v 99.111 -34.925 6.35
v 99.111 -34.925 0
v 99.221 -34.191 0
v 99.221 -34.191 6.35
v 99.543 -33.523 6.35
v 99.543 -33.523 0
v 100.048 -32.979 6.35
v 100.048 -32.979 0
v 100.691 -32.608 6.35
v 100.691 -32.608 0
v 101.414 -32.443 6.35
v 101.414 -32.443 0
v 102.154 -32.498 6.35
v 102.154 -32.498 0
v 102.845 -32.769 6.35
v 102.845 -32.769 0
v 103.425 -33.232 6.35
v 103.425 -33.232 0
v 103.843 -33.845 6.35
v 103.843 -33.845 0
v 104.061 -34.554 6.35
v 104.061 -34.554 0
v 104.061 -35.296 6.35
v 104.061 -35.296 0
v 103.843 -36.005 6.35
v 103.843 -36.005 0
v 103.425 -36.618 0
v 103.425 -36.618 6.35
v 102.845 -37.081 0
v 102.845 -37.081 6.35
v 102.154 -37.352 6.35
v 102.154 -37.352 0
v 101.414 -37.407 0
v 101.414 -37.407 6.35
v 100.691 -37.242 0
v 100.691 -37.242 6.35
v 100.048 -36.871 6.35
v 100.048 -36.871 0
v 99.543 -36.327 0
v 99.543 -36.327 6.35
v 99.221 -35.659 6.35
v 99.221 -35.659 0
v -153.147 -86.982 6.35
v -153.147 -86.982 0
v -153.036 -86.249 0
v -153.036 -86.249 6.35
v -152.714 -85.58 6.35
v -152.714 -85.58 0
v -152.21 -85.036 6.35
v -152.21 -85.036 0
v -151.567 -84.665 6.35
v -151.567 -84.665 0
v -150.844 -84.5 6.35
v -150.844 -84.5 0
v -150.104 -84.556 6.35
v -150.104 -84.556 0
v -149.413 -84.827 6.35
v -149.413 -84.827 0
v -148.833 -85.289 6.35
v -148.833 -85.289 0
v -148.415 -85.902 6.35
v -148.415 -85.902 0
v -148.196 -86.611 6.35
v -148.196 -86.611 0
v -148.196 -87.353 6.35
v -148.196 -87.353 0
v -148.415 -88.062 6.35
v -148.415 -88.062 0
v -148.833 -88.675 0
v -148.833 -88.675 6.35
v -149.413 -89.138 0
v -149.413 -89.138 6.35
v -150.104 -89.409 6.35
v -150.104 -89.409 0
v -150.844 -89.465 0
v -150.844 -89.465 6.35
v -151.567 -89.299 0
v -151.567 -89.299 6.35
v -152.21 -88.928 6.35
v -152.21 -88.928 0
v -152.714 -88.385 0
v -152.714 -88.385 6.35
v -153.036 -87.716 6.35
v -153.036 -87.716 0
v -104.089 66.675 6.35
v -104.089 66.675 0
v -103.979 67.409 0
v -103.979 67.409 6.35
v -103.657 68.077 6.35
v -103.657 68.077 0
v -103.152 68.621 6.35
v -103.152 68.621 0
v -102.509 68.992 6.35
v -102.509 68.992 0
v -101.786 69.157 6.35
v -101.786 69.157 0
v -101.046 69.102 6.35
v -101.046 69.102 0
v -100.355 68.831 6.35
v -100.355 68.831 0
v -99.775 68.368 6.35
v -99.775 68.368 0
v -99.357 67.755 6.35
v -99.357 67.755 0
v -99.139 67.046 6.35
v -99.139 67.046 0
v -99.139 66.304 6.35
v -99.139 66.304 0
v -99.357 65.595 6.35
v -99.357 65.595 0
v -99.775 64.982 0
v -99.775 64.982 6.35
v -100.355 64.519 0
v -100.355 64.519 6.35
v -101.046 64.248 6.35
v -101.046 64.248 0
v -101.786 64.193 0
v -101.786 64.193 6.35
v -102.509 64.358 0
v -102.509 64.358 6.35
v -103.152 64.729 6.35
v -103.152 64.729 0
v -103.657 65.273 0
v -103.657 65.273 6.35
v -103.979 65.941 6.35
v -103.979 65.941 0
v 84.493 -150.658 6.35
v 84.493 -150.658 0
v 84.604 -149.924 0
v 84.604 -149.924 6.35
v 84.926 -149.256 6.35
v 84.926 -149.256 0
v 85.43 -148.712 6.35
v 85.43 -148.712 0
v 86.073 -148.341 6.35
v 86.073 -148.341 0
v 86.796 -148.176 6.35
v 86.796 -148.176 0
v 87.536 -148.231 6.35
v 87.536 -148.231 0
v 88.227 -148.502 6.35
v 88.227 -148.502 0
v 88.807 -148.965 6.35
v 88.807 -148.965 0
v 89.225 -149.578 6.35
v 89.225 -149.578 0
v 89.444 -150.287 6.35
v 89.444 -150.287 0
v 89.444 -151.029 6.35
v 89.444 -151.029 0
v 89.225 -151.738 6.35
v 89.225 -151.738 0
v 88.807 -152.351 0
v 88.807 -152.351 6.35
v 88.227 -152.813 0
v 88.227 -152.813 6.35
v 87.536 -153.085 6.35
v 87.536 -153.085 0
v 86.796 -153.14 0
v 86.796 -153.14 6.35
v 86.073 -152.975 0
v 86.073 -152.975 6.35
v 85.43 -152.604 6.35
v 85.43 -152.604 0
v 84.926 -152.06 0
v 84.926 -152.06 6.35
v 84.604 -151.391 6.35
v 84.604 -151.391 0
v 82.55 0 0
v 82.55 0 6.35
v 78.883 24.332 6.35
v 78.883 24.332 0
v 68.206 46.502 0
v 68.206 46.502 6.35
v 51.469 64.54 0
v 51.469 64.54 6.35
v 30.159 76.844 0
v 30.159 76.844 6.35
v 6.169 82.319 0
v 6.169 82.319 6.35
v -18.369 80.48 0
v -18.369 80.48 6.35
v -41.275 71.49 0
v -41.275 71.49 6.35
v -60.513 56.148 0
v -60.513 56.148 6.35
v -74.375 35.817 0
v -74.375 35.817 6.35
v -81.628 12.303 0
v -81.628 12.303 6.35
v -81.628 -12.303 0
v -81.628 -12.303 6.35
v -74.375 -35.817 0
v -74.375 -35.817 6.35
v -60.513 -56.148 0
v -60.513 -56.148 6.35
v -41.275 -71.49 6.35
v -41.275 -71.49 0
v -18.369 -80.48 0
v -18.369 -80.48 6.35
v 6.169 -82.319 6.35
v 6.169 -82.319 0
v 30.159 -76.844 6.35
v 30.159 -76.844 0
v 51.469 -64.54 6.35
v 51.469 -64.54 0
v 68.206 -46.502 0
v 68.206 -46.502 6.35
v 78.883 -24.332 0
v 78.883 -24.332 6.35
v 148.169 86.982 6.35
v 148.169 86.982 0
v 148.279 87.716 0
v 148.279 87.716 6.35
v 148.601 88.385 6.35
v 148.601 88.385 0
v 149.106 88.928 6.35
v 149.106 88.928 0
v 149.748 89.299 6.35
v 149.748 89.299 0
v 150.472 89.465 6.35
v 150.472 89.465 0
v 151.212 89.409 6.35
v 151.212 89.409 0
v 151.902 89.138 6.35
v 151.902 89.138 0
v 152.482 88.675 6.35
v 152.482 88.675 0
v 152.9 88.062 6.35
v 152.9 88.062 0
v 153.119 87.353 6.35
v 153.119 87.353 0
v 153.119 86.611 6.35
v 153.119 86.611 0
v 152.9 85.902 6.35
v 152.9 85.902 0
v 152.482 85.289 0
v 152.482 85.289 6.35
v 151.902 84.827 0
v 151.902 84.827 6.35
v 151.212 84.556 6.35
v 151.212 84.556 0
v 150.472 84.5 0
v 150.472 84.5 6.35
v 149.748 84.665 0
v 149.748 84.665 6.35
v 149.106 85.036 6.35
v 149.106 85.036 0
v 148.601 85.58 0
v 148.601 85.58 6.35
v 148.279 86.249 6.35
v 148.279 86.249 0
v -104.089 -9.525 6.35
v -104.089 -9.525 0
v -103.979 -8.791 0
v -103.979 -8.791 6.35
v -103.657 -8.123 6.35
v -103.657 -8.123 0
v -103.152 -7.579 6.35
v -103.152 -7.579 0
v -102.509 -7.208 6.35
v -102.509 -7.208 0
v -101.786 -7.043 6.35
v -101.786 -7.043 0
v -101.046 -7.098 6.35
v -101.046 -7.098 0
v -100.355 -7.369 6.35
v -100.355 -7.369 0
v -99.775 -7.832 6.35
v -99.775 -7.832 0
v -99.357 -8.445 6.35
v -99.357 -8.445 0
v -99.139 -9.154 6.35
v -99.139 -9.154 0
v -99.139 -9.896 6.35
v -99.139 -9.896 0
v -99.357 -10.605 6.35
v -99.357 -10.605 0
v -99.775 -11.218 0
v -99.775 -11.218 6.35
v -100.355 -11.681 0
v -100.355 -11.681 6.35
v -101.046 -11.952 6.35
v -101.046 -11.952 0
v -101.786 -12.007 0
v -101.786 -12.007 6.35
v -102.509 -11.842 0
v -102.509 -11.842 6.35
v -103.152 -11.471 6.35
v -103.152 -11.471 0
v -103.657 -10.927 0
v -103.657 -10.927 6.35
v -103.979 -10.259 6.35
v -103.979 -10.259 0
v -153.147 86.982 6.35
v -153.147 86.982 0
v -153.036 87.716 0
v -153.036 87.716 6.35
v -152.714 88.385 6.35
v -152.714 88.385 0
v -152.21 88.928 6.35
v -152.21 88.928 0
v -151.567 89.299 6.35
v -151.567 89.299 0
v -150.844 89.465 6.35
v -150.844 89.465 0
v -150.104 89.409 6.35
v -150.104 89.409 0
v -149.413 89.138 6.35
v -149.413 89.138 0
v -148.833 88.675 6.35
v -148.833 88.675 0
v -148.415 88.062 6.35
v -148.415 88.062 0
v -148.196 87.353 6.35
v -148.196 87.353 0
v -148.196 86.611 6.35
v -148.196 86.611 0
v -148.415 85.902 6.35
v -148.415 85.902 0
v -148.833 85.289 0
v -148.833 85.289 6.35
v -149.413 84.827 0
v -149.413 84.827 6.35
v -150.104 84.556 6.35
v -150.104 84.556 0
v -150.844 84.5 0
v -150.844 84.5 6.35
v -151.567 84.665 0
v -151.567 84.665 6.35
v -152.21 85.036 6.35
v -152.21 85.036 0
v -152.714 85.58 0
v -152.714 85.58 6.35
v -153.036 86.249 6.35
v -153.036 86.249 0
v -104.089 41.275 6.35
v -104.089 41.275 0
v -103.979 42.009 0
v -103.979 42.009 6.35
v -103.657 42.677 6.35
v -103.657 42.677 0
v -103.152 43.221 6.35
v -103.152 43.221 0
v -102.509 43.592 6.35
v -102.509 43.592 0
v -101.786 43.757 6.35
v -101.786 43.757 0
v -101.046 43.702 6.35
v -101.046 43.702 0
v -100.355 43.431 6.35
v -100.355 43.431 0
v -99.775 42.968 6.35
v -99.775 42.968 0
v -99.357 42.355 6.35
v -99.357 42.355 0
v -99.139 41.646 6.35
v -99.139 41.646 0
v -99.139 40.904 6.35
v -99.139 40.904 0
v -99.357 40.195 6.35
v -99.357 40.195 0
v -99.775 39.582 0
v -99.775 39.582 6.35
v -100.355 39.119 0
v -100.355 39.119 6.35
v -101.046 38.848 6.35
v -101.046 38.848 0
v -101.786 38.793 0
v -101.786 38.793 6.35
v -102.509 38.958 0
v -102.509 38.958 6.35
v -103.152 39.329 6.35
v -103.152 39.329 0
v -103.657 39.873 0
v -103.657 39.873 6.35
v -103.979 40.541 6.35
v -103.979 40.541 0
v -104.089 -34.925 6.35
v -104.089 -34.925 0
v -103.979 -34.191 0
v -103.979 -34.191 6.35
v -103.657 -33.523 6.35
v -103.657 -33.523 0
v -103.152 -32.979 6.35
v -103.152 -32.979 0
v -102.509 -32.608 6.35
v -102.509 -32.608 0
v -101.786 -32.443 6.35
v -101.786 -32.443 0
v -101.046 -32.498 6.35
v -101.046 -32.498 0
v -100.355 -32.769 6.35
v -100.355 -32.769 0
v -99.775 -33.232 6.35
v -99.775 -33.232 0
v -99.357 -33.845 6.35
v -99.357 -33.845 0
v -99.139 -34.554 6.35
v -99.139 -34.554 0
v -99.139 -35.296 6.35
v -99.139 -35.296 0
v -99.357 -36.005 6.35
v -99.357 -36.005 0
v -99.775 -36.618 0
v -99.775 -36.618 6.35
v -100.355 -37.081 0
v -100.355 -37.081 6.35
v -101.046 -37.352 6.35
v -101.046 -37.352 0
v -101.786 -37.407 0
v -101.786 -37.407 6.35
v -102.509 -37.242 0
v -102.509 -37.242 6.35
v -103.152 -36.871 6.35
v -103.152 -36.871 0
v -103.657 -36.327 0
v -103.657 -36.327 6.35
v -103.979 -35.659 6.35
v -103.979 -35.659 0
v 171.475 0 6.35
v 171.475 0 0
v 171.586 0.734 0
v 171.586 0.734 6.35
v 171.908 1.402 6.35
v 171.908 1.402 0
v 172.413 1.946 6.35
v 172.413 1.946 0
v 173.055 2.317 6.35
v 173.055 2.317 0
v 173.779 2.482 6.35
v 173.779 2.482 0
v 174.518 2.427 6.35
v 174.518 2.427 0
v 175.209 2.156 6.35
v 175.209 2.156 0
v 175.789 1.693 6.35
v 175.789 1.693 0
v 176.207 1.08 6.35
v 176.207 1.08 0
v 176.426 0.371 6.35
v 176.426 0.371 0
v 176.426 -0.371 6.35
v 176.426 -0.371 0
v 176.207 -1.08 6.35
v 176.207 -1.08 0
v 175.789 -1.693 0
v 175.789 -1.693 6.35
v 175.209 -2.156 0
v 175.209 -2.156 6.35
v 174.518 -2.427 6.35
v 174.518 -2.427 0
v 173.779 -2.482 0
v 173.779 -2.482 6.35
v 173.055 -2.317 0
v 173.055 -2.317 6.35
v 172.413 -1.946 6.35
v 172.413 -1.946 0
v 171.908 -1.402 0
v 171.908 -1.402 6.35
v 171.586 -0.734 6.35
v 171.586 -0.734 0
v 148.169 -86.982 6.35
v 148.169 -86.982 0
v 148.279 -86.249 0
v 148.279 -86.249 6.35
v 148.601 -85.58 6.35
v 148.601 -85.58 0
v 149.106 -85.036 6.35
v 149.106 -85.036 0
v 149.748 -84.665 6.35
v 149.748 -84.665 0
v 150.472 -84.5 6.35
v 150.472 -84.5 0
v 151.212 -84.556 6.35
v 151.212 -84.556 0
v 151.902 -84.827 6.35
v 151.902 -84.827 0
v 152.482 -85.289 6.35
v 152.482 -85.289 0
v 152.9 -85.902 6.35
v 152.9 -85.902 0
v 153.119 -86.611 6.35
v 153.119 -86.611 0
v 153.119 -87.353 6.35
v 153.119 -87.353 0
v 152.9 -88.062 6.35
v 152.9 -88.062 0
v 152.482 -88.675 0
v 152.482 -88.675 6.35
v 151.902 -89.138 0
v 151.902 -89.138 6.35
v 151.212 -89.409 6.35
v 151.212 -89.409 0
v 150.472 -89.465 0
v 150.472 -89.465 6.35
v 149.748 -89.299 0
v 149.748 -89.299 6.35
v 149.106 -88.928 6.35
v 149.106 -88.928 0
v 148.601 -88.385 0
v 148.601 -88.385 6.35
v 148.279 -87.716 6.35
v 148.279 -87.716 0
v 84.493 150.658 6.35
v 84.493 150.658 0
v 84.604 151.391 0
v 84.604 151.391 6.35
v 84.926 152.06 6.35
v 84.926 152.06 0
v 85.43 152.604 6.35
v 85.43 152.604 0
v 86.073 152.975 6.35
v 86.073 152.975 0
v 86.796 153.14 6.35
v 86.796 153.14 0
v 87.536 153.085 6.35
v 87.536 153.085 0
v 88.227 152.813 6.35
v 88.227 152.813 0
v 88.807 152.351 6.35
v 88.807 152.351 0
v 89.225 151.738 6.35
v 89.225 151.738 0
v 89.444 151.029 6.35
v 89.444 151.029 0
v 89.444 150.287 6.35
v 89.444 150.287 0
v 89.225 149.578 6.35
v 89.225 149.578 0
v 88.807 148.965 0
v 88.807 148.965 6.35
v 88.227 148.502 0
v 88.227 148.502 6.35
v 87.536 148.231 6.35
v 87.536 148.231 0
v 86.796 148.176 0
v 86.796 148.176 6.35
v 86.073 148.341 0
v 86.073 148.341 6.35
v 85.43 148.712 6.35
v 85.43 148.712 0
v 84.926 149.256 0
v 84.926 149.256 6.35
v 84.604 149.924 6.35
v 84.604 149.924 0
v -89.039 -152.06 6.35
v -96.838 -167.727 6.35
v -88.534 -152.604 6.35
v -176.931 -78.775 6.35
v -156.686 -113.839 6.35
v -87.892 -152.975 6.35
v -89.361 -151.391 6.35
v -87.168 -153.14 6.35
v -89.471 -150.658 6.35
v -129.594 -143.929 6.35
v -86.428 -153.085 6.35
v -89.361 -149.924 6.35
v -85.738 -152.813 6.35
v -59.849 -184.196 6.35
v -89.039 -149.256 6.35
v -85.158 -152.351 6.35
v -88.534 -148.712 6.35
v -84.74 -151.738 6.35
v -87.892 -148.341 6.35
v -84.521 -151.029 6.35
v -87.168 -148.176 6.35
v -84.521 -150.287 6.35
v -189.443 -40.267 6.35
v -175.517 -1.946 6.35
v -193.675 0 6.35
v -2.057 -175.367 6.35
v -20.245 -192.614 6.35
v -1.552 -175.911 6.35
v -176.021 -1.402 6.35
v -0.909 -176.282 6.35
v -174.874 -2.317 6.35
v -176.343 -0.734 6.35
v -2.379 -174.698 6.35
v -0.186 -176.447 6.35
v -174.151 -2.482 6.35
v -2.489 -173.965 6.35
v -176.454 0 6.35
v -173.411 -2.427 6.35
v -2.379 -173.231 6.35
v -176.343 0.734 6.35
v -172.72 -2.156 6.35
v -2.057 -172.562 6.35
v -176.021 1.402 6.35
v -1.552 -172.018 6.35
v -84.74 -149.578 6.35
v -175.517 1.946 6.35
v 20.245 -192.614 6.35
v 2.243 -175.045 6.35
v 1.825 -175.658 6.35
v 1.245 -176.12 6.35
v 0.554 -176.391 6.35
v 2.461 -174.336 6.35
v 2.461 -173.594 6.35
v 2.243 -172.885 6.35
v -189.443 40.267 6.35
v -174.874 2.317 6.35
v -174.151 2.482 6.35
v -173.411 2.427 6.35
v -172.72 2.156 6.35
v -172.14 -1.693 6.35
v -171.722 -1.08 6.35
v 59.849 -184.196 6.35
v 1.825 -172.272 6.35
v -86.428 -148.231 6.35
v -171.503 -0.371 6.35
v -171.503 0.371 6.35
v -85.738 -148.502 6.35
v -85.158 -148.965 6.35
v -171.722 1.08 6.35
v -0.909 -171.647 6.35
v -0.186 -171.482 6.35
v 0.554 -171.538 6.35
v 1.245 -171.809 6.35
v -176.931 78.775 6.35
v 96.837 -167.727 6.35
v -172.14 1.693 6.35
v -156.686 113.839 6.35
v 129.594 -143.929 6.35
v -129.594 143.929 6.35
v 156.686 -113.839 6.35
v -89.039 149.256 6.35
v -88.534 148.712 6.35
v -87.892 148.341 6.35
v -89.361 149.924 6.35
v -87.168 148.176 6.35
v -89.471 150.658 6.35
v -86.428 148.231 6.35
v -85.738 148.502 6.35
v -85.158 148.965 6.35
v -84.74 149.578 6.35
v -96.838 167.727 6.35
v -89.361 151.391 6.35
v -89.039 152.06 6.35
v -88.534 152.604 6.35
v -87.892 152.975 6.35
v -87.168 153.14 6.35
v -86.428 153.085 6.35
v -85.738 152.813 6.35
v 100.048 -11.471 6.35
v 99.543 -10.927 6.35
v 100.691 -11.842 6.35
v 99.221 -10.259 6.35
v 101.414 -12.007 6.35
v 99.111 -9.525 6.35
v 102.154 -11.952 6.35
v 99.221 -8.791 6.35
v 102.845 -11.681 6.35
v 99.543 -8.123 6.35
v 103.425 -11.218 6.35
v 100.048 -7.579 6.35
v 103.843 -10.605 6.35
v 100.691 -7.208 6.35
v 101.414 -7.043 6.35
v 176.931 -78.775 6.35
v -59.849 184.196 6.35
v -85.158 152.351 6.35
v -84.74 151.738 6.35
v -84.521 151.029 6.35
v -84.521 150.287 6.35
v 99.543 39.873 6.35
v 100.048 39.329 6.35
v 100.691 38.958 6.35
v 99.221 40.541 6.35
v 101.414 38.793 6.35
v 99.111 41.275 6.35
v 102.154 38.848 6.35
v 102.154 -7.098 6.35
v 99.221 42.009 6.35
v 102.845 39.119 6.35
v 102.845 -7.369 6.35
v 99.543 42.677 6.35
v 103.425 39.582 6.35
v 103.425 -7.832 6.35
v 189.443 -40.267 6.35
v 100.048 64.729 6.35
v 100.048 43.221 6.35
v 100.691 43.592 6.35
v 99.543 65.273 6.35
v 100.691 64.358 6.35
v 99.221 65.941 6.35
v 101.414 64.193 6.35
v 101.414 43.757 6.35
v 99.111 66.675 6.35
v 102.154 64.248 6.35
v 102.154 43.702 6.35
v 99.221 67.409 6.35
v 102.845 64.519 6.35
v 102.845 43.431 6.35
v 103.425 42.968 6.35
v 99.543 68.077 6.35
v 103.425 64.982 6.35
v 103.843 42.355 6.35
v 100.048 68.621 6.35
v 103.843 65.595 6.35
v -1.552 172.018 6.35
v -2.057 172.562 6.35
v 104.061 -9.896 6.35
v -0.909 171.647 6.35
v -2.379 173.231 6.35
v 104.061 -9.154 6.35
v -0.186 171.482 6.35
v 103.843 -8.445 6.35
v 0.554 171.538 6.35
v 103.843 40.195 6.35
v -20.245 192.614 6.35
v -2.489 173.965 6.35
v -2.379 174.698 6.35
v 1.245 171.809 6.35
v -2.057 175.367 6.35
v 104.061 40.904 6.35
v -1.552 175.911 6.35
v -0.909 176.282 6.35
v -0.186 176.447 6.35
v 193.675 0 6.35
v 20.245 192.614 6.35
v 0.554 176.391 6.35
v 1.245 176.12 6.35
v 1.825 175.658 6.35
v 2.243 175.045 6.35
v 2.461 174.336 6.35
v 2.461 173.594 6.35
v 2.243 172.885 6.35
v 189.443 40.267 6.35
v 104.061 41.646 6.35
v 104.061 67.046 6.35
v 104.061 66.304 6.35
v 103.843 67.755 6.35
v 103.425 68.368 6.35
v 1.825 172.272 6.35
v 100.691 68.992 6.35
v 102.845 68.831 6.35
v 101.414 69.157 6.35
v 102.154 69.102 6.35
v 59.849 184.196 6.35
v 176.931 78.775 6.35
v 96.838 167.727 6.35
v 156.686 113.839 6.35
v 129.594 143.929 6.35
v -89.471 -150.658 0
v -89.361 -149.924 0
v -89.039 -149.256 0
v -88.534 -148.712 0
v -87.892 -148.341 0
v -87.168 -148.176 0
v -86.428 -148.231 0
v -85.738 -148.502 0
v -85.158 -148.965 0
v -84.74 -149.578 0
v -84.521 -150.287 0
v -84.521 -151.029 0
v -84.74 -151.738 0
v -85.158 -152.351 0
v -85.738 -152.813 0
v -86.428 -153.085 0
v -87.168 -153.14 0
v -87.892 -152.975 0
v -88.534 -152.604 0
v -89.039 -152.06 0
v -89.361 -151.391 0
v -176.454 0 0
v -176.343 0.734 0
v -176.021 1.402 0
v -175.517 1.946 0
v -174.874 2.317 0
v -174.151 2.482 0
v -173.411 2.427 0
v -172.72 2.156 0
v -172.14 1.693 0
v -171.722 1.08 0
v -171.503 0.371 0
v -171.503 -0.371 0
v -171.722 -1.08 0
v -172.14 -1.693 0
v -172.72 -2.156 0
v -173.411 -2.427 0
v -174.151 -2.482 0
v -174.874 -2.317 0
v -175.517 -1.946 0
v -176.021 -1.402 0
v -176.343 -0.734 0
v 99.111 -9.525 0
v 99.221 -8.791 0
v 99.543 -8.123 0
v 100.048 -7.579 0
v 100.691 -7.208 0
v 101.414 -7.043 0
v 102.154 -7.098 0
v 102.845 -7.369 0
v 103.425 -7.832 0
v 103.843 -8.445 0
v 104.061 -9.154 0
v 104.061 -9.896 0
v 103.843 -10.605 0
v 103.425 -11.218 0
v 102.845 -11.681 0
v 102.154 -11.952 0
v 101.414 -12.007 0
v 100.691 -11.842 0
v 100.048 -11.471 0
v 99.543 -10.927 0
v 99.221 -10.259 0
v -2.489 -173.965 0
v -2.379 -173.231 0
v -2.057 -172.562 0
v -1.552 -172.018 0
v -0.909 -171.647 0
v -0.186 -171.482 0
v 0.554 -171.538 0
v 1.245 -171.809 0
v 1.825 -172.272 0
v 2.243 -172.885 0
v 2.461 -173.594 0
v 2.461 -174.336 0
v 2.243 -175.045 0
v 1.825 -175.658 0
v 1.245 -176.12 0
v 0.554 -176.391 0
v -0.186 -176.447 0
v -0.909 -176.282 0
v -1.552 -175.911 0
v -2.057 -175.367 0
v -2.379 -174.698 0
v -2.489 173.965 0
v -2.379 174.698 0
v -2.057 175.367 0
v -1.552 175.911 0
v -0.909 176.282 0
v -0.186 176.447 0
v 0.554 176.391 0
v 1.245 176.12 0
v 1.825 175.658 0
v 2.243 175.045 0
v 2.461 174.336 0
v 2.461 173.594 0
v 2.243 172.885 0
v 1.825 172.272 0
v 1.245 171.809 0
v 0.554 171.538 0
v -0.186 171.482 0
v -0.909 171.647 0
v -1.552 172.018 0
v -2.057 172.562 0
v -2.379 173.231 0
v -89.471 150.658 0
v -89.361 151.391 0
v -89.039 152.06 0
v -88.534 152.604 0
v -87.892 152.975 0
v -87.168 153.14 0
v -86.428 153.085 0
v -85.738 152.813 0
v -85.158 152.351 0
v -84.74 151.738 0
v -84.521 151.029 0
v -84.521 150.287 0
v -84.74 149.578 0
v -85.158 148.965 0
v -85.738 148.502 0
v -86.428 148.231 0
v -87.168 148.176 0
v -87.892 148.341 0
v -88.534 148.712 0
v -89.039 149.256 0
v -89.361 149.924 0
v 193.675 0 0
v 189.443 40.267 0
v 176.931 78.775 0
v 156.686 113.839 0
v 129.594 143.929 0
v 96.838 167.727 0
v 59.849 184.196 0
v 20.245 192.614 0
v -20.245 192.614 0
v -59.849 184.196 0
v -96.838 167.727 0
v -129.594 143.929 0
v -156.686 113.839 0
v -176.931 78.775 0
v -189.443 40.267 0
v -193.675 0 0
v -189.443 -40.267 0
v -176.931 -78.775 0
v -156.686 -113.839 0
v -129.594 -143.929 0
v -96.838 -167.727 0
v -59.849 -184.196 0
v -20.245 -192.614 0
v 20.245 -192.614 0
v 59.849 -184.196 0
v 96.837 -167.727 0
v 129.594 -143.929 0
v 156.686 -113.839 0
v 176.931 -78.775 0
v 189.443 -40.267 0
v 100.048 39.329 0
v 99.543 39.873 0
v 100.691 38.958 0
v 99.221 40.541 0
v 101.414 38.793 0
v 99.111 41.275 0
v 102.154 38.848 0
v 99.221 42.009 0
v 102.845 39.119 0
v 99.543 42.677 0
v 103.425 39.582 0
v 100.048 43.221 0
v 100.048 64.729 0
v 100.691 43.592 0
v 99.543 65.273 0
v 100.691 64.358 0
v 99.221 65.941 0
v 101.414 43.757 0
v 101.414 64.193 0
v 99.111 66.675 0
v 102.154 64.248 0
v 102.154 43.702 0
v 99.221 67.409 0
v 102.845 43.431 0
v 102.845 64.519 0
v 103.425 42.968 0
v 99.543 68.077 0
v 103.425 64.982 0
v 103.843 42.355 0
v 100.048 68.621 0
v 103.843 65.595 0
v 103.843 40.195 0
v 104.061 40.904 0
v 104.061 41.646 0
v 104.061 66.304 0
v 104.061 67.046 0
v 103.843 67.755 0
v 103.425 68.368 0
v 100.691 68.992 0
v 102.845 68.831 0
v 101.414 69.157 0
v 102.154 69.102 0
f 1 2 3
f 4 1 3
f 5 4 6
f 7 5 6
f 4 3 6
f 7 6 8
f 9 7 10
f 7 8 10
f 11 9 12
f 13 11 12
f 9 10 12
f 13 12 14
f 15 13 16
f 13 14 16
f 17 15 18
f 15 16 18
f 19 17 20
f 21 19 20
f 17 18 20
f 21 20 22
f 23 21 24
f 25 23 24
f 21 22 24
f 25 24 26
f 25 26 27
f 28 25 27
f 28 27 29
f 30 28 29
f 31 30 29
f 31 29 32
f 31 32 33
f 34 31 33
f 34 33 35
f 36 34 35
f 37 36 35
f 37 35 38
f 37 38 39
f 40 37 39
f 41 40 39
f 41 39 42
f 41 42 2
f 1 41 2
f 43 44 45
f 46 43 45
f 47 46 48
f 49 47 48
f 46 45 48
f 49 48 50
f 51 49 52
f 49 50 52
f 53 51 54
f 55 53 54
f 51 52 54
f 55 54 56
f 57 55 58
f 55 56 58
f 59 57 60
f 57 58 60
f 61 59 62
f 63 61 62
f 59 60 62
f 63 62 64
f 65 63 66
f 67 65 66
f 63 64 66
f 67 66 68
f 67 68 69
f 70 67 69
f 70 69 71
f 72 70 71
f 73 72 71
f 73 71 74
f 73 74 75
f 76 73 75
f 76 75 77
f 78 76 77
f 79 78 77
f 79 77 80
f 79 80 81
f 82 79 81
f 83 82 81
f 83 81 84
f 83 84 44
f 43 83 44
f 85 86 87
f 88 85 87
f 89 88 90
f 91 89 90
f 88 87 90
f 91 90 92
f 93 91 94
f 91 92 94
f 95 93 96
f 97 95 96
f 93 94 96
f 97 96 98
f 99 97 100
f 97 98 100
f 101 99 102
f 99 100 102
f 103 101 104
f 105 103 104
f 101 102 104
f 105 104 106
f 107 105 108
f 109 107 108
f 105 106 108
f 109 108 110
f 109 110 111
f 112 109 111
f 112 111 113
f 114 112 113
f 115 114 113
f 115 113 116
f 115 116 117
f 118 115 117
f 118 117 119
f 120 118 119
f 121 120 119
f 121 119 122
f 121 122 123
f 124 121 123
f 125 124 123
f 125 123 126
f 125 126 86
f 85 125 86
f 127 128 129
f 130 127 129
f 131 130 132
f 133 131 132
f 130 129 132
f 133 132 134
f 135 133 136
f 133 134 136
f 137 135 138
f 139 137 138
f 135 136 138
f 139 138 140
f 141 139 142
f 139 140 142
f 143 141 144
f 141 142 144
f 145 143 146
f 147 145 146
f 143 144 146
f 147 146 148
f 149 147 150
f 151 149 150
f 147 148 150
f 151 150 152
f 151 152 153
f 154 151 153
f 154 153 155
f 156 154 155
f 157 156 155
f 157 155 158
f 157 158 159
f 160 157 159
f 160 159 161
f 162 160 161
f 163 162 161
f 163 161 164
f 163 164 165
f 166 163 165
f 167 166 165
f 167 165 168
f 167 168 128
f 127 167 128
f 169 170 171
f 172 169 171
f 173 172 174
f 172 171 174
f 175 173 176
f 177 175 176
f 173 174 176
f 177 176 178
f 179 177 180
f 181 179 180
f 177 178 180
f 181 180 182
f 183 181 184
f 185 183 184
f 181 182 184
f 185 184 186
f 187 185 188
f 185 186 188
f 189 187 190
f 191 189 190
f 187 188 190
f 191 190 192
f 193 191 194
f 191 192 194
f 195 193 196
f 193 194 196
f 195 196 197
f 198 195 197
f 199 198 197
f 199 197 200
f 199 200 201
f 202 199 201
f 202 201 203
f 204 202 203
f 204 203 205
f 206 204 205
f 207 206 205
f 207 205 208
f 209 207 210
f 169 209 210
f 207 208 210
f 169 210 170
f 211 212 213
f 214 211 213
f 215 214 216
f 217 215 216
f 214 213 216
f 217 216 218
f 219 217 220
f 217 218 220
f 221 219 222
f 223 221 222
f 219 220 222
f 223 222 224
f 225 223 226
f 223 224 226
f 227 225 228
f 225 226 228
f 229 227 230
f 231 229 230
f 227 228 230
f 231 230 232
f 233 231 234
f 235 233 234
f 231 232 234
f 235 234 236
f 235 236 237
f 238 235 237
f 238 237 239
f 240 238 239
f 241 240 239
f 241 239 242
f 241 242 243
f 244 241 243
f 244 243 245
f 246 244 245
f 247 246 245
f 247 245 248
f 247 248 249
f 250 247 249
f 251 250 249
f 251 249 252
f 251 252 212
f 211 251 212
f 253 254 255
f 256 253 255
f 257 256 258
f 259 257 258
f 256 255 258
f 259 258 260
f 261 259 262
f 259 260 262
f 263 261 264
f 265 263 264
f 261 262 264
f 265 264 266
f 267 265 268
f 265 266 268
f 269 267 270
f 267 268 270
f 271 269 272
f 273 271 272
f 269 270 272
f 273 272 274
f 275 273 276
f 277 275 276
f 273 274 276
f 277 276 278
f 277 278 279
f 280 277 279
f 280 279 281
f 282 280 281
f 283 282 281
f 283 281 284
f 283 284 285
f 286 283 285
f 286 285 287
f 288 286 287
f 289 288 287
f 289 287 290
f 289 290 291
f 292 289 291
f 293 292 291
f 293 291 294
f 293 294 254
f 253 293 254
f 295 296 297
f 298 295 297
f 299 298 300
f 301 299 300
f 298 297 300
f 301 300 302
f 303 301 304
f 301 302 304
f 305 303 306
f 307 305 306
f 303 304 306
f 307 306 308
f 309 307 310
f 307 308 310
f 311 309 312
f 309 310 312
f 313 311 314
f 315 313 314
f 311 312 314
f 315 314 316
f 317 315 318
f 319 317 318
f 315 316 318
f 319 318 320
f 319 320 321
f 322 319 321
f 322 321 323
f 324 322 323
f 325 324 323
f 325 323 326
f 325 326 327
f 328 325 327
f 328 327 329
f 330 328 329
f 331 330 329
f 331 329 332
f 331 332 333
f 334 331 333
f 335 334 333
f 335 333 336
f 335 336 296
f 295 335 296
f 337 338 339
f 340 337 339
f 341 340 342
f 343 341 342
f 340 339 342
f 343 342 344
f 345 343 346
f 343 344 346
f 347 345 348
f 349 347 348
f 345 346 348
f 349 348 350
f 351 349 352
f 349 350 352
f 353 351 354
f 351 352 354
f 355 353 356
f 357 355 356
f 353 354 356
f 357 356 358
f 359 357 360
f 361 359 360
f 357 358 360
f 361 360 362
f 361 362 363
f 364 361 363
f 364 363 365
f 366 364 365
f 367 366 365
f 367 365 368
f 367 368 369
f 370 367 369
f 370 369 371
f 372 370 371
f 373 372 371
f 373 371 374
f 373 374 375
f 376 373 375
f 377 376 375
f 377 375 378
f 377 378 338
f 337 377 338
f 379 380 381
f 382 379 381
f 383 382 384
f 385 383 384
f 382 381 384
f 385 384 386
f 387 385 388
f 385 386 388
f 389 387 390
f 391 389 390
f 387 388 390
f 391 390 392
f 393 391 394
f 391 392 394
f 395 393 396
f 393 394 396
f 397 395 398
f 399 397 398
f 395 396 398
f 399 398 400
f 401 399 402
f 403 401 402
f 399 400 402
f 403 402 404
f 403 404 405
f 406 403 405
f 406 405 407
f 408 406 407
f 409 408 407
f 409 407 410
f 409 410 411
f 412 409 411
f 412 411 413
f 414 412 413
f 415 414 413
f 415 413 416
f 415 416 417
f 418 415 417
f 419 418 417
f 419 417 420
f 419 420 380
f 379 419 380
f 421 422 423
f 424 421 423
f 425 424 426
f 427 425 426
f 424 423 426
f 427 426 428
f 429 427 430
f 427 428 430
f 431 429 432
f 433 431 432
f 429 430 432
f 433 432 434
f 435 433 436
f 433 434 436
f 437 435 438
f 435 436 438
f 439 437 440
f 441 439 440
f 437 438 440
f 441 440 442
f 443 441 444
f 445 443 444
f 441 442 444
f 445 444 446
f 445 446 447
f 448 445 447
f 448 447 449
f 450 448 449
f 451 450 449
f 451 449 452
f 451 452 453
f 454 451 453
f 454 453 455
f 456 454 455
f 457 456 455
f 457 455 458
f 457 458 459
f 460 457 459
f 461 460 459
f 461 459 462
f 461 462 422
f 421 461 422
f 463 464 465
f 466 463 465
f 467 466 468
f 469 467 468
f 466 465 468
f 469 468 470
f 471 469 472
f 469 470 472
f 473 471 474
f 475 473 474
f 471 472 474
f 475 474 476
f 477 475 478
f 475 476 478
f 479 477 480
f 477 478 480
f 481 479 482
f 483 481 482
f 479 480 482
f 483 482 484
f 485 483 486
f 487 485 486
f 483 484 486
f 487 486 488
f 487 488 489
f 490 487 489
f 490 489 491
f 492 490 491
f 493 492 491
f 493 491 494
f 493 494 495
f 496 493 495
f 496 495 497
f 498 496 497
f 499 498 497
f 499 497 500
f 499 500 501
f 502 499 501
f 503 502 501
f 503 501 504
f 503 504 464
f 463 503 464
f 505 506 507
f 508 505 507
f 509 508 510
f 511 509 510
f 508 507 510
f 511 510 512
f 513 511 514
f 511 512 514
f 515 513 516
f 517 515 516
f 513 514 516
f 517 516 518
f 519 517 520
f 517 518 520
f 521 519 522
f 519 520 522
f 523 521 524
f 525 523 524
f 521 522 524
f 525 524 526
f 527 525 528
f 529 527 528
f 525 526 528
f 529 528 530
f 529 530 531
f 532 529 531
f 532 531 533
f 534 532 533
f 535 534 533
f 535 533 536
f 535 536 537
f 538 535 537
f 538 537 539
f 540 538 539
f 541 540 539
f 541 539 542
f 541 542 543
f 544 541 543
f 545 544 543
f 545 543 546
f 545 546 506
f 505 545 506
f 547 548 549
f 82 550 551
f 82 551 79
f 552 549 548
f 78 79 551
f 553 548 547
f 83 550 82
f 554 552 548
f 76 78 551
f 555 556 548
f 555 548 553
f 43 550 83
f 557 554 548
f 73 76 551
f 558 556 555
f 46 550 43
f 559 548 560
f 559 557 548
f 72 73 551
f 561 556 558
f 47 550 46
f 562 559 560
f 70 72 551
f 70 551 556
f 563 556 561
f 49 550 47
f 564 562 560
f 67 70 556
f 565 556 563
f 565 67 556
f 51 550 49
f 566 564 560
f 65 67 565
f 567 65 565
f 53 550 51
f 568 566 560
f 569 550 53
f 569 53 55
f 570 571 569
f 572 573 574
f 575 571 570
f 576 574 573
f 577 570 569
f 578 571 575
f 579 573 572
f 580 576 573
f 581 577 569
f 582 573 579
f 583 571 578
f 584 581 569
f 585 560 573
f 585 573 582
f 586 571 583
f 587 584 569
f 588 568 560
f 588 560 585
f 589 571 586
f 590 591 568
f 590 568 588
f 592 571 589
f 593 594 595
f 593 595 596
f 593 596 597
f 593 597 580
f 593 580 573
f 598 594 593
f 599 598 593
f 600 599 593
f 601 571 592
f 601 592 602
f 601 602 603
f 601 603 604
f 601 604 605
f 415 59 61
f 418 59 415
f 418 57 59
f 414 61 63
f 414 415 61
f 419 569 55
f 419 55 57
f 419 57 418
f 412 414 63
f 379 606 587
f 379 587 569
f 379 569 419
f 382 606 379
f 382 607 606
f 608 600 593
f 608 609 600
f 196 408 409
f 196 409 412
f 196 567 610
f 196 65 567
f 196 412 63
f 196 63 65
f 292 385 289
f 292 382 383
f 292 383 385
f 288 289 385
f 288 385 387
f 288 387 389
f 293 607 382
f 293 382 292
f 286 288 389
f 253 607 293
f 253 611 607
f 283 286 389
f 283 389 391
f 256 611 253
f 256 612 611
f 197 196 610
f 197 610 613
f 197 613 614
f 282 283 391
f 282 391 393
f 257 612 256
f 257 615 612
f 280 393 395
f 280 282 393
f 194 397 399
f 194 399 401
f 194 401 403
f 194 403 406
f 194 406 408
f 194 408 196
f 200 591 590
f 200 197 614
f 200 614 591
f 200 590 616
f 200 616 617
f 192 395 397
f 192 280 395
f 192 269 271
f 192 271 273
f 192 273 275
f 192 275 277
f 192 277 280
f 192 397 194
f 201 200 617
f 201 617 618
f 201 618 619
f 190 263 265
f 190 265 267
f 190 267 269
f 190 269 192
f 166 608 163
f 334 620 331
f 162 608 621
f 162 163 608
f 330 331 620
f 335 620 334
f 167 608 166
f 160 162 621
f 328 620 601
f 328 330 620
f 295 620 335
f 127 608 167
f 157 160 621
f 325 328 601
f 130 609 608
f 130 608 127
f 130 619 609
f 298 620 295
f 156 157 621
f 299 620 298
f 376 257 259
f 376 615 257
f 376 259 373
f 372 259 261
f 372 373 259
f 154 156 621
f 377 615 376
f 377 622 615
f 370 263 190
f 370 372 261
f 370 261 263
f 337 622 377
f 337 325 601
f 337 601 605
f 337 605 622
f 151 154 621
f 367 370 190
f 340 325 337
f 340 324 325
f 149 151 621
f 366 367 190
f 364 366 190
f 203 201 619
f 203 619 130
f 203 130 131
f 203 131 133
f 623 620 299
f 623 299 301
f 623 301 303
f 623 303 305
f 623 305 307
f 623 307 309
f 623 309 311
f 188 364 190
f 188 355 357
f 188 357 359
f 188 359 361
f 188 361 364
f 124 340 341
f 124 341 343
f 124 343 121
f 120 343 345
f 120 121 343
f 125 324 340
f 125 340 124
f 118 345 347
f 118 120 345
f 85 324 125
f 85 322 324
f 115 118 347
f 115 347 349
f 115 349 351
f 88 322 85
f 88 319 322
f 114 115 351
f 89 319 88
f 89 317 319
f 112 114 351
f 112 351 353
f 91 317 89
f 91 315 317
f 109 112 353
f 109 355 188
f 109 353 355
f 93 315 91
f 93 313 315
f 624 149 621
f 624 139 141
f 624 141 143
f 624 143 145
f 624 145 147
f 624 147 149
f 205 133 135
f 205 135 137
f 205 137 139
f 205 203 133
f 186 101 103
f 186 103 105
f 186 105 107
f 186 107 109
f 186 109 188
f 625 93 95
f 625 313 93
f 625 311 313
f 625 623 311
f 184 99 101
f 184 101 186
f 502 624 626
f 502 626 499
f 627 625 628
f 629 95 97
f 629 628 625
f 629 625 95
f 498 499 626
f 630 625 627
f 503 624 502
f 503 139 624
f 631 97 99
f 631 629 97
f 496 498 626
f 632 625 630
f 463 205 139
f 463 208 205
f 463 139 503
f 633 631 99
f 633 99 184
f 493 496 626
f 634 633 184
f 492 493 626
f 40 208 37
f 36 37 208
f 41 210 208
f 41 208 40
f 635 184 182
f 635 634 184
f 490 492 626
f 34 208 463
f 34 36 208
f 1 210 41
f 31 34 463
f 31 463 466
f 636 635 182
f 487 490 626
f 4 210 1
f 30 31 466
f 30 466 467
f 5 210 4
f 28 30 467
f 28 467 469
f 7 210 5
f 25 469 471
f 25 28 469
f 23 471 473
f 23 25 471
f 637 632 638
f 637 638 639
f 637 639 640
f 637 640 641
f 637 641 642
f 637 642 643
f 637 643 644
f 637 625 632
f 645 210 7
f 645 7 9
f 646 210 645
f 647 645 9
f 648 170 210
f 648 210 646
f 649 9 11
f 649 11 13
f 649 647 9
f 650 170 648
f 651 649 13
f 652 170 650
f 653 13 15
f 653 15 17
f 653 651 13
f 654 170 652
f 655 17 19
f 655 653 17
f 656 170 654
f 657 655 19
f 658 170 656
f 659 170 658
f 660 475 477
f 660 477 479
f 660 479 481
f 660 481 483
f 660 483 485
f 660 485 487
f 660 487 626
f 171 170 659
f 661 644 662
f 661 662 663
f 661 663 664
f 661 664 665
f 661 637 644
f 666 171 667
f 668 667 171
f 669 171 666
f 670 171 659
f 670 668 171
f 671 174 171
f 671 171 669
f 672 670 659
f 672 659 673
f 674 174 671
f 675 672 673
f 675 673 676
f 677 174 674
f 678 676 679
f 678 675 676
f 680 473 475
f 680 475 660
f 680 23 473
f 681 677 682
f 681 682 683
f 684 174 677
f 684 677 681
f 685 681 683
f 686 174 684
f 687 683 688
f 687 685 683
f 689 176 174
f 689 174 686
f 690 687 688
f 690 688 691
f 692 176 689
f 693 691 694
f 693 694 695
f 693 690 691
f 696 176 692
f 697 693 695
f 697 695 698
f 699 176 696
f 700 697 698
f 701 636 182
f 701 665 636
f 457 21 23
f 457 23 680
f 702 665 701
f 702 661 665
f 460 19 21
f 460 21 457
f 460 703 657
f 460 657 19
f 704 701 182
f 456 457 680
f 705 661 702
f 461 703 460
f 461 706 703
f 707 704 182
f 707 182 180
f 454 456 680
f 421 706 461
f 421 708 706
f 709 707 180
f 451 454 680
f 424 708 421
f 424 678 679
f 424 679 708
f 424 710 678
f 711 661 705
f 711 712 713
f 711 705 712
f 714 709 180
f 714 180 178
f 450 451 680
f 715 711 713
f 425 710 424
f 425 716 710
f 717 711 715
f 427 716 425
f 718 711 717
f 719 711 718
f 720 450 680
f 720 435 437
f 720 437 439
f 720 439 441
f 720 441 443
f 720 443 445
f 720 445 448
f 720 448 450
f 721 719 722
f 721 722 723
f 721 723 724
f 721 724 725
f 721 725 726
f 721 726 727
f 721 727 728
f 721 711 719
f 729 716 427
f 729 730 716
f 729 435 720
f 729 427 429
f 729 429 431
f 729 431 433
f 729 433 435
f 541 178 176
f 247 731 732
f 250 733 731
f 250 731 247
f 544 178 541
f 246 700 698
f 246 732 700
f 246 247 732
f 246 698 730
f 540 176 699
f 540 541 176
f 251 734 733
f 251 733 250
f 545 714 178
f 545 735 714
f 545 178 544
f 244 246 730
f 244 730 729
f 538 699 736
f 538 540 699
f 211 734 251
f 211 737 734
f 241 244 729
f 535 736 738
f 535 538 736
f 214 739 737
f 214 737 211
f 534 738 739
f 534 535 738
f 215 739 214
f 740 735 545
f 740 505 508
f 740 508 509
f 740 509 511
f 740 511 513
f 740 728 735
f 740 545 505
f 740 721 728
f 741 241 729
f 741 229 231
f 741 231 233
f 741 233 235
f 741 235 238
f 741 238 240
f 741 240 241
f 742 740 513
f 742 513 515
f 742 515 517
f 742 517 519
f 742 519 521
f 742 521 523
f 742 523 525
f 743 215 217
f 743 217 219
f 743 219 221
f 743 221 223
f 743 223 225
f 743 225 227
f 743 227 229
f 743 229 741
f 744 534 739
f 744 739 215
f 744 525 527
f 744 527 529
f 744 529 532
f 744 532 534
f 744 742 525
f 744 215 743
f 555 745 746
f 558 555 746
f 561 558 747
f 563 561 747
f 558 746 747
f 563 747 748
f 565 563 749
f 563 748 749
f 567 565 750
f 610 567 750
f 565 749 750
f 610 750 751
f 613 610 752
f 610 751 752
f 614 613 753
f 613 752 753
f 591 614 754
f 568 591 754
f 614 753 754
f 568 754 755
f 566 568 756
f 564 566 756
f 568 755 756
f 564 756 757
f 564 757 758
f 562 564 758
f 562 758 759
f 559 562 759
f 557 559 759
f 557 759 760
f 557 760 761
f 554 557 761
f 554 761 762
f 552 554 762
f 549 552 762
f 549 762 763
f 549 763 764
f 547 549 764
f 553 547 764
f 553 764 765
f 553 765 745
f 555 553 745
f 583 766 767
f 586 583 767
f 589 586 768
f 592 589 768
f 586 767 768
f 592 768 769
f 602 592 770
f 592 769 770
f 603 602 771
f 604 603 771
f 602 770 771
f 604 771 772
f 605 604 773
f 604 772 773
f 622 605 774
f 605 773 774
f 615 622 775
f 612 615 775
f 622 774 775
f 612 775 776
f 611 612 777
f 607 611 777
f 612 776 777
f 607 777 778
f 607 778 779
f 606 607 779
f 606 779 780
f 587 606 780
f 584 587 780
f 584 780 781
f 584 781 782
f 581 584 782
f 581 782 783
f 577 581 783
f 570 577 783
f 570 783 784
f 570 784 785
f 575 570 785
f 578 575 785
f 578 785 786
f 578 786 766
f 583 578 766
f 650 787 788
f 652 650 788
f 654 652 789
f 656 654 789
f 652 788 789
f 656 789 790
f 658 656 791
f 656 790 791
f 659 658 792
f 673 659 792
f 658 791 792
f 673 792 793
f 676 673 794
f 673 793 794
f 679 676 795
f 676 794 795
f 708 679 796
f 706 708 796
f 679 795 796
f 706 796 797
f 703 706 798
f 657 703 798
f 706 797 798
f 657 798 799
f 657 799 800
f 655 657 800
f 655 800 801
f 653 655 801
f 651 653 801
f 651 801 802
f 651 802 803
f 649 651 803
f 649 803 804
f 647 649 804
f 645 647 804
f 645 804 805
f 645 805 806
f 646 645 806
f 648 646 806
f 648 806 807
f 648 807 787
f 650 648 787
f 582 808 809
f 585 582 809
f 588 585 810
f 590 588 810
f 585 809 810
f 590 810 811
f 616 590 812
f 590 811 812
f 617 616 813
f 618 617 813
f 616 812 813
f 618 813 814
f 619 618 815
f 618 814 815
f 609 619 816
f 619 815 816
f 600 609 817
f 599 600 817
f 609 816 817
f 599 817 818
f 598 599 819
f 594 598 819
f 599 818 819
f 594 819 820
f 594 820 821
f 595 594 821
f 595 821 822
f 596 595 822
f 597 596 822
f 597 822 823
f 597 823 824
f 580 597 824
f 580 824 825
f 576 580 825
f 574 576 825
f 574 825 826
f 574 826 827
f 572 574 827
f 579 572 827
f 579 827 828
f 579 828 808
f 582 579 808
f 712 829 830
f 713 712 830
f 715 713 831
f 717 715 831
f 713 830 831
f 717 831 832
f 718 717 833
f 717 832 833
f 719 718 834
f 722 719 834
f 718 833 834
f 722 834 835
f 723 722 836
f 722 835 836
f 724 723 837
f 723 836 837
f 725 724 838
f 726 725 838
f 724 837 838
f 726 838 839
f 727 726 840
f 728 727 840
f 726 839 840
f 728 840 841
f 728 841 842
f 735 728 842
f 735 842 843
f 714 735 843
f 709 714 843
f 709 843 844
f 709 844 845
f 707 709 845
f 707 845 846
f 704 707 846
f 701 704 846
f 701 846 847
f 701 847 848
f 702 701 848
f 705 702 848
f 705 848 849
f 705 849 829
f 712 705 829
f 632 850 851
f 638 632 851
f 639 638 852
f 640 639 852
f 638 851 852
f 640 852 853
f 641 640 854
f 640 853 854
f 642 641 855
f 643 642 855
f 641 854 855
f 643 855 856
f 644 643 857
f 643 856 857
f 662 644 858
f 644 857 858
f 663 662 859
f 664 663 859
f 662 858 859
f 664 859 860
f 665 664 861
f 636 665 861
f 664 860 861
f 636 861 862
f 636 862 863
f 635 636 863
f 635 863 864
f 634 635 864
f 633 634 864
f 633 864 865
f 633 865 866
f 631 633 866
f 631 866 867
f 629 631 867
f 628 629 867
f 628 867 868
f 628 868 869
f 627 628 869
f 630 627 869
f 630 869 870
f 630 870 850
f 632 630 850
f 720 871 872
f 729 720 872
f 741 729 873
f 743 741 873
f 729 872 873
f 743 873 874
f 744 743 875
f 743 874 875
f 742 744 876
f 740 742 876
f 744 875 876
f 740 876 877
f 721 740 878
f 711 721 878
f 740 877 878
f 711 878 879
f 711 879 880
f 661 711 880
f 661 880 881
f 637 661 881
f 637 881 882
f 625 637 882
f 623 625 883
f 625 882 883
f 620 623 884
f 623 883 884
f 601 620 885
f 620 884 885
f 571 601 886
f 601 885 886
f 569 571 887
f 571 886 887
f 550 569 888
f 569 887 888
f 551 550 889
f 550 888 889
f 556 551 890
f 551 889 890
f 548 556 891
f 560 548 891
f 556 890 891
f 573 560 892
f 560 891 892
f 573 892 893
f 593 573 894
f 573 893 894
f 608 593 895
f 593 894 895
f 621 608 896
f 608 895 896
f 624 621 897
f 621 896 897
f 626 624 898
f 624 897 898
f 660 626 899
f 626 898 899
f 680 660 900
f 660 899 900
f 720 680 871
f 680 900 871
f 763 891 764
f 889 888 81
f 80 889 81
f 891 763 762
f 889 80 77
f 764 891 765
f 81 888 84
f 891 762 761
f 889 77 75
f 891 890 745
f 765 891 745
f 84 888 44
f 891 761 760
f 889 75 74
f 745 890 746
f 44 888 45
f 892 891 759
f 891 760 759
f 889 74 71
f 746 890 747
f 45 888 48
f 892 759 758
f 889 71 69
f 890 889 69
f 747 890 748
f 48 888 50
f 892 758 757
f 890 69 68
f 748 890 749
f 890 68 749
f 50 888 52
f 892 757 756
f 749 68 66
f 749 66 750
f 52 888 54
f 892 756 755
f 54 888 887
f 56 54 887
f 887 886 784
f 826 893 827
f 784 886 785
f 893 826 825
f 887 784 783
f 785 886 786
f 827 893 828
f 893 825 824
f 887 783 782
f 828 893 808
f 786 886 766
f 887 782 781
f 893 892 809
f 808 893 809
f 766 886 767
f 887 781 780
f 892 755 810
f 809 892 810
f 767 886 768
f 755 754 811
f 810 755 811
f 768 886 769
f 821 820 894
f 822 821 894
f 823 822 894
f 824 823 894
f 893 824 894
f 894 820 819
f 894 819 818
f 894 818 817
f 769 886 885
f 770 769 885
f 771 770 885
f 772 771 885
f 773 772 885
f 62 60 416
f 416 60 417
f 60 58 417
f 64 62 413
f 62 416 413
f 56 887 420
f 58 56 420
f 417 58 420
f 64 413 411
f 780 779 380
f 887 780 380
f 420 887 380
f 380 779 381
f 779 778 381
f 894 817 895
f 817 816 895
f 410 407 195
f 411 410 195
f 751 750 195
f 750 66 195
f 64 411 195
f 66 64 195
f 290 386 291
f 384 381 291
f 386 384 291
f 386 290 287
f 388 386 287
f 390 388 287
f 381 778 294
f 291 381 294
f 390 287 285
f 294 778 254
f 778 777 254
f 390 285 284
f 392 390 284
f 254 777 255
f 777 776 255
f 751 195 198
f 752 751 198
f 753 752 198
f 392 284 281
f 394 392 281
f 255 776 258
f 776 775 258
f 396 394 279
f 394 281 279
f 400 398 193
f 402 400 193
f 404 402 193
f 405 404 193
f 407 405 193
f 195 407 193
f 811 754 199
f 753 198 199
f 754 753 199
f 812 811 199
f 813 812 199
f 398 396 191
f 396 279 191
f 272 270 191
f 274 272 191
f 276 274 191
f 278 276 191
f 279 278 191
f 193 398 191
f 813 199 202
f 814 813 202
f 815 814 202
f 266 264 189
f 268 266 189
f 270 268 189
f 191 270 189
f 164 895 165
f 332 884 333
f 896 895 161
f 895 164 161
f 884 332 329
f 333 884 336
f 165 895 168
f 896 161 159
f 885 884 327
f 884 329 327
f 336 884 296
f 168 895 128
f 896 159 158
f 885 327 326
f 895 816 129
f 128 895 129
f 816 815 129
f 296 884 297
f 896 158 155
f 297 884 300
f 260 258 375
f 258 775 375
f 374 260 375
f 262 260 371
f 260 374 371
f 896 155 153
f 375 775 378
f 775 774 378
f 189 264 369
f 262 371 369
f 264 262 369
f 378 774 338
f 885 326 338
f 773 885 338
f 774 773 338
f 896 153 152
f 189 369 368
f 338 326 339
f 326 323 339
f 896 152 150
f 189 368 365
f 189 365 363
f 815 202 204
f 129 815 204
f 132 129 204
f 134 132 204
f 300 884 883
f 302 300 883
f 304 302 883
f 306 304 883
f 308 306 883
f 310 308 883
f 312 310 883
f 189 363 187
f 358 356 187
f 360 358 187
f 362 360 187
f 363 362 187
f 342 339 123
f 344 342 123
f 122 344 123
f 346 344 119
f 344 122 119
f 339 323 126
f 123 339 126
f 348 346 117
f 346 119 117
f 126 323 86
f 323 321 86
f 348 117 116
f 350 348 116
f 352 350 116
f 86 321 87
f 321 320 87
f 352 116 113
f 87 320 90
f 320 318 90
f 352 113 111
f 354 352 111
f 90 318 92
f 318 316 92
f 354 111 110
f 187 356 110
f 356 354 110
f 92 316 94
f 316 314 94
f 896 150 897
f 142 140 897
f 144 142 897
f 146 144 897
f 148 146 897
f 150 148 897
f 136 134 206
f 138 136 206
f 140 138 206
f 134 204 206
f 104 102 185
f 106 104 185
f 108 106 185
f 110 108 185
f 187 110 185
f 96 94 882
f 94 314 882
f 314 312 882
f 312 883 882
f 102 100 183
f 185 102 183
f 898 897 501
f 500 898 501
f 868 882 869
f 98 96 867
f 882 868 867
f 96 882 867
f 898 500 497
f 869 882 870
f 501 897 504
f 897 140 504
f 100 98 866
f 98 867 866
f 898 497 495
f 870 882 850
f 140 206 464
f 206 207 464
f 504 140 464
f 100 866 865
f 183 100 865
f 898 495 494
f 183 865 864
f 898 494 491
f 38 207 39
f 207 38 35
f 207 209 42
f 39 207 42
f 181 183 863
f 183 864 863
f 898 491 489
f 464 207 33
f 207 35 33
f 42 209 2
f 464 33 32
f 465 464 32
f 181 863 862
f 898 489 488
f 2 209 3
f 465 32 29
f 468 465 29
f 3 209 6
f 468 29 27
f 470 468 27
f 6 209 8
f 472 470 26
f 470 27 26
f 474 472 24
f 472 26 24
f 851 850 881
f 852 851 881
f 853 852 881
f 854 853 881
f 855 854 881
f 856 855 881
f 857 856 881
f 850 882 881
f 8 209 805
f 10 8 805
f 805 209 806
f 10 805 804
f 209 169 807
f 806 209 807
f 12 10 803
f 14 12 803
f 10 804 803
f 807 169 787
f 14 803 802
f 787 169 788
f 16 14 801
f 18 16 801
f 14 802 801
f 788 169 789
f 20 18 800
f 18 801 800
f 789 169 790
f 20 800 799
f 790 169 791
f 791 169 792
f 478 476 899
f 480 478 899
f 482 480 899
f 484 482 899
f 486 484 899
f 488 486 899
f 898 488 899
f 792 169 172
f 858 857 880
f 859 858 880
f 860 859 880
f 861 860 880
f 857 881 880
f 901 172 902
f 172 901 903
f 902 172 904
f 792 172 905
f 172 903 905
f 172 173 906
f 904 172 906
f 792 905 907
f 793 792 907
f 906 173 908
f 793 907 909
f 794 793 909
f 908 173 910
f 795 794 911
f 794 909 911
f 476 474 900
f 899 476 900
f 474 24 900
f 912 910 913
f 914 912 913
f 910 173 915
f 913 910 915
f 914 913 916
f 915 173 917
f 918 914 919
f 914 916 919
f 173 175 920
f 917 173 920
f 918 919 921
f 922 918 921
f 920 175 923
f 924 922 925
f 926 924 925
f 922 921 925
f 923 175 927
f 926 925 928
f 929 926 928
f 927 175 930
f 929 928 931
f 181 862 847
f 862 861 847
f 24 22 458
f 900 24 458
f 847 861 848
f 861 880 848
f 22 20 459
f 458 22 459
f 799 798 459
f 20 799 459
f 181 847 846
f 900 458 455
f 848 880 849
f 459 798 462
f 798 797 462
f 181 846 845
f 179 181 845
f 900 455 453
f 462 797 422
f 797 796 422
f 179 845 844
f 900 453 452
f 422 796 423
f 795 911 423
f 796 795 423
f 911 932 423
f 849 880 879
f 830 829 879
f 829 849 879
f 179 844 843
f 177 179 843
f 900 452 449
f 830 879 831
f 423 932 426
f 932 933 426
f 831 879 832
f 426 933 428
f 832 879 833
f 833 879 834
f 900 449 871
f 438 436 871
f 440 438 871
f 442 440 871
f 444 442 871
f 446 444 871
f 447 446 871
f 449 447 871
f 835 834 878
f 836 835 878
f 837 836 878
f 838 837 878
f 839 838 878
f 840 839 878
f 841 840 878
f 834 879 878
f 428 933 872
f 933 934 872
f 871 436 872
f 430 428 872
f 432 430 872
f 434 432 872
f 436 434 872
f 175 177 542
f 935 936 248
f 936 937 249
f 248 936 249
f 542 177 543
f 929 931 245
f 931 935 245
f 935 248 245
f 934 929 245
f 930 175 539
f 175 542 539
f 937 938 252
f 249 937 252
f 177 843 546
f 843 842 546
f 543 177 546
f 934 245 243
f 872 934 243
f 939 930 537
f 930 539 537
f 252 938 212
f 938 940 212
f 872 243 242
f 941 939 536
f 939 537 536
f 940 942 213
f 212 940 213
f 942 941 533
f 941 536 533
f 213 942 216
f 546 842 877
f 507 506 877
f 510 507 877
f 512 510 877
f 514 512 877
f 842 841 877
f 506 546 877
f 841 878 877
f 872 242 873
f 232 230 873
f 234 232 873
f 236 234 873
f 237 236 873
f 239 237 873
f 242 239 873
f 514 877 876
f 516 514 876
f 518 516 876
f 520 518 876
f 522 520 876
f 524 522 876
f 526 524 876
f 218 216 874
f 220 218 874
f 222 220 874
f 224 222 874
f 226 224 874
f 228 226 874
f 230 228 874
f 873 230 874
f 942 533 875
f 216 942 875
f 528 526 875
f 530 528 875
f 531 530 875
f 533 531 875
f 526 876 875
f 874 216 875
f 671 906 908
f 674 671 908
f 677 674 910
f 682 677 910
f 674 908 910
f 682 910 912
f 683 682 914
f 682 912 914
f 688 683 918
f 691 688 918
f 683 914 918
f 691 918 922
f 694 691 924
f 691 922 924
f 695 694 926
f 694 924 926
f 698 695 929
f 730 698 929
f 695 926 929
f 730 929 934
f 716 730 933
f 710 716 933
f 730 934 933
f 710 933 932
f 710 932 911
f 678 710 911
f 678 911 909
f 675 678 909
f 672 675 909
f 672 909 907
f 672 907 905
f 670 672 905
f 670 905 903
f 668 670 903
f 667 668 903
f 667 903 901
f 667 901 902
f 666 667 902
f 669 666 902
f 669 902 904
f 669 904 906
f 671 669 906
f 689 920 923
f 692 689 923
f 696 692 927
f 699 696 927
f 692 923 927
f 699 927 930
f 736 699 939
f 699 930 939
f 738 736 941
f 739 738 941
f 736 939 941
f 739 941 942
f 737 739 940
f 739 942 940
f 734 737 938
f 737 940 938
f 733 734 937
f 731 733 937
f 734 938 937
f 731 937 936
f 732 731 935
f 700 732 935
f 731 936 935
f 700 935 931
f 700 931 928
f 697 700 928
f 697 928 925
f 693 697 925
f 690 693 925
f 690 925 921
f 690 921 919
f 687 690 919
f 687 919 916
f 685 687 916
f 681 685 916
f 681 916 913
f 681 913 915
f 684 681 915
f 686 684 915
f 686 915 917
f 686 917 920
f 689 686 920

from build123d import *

# Parameters (mm, degrees)
SKETCH1_R                  = 193.675
BOSS_EXTRUDE1_DEPTH        = 6.35
F_9_0_196_DIAMETER_HOLE1_D = 4.9784
SKETCH5_R                  = 82.55
CUT_EXTRUDE1_DEPTH         = 6.35
F_9_0_196_DIAMETER_HOLE2_D = 4.9784


with BuildPart() as part:
    # Sketch1 → Boss-Extrude1 (new body)
    with BuildSketch(Plane(origin=(0, 0, 0), x_dir=(0, 1, 0), z_dir=(0, 0, 1))):
        with Locations(Location((0, 0, 0), (0, 0, 270))):
            Circle(SKETCH1_R)
    extrude(amount=BOSS_EXTRUDE1_DEPTH)

    # #9 (0.196) Diameter Hole1 (through all)
    with Locations(Plane.XY.offset(6.35)):
        with Locations((-150.657762959, 86.9823), (-173.9646, 0), (-150.657762959, -86.9823), (-86.9823, -150.657762959), (0, -173.9646), (86.9823, -150.657762959), (150.657762959, -86.9823), (173.9646, 0), (150.657762959, 86.9823), (86.9823, 150.657762959), (0, 173.9646), (-86.9823, 150.657762959)):
            Hole(F_9_0_196_DIAMETER_HOLE1_D / 2)

    # Sketch5 → Cut-Extrude1 (cut)
    with BuildSketch(Plane.XY.offset(6.35)):
        Circle(SKETCH5_R)
    extrude(amount=-CUT_EXTRUDE1_DEPTH, mode=Mode.SUBTRACT)

    # #9 (0.196) Diameter Hole2 (through all)
    with Locations(Plane.XY.offset(6.35)):
        with Locations((101.6, 66.675), (101.6, 41.275), (101.6, -9.525), (101.6, -34.925), (-101.6, -34.925), (-101.6, -9.525), (-101.6, 41.275), (-101.6, 66.675)):
            Hole(F_9_0_196_DIAMETER_HOLE2_D / 2)


solid = part.part
